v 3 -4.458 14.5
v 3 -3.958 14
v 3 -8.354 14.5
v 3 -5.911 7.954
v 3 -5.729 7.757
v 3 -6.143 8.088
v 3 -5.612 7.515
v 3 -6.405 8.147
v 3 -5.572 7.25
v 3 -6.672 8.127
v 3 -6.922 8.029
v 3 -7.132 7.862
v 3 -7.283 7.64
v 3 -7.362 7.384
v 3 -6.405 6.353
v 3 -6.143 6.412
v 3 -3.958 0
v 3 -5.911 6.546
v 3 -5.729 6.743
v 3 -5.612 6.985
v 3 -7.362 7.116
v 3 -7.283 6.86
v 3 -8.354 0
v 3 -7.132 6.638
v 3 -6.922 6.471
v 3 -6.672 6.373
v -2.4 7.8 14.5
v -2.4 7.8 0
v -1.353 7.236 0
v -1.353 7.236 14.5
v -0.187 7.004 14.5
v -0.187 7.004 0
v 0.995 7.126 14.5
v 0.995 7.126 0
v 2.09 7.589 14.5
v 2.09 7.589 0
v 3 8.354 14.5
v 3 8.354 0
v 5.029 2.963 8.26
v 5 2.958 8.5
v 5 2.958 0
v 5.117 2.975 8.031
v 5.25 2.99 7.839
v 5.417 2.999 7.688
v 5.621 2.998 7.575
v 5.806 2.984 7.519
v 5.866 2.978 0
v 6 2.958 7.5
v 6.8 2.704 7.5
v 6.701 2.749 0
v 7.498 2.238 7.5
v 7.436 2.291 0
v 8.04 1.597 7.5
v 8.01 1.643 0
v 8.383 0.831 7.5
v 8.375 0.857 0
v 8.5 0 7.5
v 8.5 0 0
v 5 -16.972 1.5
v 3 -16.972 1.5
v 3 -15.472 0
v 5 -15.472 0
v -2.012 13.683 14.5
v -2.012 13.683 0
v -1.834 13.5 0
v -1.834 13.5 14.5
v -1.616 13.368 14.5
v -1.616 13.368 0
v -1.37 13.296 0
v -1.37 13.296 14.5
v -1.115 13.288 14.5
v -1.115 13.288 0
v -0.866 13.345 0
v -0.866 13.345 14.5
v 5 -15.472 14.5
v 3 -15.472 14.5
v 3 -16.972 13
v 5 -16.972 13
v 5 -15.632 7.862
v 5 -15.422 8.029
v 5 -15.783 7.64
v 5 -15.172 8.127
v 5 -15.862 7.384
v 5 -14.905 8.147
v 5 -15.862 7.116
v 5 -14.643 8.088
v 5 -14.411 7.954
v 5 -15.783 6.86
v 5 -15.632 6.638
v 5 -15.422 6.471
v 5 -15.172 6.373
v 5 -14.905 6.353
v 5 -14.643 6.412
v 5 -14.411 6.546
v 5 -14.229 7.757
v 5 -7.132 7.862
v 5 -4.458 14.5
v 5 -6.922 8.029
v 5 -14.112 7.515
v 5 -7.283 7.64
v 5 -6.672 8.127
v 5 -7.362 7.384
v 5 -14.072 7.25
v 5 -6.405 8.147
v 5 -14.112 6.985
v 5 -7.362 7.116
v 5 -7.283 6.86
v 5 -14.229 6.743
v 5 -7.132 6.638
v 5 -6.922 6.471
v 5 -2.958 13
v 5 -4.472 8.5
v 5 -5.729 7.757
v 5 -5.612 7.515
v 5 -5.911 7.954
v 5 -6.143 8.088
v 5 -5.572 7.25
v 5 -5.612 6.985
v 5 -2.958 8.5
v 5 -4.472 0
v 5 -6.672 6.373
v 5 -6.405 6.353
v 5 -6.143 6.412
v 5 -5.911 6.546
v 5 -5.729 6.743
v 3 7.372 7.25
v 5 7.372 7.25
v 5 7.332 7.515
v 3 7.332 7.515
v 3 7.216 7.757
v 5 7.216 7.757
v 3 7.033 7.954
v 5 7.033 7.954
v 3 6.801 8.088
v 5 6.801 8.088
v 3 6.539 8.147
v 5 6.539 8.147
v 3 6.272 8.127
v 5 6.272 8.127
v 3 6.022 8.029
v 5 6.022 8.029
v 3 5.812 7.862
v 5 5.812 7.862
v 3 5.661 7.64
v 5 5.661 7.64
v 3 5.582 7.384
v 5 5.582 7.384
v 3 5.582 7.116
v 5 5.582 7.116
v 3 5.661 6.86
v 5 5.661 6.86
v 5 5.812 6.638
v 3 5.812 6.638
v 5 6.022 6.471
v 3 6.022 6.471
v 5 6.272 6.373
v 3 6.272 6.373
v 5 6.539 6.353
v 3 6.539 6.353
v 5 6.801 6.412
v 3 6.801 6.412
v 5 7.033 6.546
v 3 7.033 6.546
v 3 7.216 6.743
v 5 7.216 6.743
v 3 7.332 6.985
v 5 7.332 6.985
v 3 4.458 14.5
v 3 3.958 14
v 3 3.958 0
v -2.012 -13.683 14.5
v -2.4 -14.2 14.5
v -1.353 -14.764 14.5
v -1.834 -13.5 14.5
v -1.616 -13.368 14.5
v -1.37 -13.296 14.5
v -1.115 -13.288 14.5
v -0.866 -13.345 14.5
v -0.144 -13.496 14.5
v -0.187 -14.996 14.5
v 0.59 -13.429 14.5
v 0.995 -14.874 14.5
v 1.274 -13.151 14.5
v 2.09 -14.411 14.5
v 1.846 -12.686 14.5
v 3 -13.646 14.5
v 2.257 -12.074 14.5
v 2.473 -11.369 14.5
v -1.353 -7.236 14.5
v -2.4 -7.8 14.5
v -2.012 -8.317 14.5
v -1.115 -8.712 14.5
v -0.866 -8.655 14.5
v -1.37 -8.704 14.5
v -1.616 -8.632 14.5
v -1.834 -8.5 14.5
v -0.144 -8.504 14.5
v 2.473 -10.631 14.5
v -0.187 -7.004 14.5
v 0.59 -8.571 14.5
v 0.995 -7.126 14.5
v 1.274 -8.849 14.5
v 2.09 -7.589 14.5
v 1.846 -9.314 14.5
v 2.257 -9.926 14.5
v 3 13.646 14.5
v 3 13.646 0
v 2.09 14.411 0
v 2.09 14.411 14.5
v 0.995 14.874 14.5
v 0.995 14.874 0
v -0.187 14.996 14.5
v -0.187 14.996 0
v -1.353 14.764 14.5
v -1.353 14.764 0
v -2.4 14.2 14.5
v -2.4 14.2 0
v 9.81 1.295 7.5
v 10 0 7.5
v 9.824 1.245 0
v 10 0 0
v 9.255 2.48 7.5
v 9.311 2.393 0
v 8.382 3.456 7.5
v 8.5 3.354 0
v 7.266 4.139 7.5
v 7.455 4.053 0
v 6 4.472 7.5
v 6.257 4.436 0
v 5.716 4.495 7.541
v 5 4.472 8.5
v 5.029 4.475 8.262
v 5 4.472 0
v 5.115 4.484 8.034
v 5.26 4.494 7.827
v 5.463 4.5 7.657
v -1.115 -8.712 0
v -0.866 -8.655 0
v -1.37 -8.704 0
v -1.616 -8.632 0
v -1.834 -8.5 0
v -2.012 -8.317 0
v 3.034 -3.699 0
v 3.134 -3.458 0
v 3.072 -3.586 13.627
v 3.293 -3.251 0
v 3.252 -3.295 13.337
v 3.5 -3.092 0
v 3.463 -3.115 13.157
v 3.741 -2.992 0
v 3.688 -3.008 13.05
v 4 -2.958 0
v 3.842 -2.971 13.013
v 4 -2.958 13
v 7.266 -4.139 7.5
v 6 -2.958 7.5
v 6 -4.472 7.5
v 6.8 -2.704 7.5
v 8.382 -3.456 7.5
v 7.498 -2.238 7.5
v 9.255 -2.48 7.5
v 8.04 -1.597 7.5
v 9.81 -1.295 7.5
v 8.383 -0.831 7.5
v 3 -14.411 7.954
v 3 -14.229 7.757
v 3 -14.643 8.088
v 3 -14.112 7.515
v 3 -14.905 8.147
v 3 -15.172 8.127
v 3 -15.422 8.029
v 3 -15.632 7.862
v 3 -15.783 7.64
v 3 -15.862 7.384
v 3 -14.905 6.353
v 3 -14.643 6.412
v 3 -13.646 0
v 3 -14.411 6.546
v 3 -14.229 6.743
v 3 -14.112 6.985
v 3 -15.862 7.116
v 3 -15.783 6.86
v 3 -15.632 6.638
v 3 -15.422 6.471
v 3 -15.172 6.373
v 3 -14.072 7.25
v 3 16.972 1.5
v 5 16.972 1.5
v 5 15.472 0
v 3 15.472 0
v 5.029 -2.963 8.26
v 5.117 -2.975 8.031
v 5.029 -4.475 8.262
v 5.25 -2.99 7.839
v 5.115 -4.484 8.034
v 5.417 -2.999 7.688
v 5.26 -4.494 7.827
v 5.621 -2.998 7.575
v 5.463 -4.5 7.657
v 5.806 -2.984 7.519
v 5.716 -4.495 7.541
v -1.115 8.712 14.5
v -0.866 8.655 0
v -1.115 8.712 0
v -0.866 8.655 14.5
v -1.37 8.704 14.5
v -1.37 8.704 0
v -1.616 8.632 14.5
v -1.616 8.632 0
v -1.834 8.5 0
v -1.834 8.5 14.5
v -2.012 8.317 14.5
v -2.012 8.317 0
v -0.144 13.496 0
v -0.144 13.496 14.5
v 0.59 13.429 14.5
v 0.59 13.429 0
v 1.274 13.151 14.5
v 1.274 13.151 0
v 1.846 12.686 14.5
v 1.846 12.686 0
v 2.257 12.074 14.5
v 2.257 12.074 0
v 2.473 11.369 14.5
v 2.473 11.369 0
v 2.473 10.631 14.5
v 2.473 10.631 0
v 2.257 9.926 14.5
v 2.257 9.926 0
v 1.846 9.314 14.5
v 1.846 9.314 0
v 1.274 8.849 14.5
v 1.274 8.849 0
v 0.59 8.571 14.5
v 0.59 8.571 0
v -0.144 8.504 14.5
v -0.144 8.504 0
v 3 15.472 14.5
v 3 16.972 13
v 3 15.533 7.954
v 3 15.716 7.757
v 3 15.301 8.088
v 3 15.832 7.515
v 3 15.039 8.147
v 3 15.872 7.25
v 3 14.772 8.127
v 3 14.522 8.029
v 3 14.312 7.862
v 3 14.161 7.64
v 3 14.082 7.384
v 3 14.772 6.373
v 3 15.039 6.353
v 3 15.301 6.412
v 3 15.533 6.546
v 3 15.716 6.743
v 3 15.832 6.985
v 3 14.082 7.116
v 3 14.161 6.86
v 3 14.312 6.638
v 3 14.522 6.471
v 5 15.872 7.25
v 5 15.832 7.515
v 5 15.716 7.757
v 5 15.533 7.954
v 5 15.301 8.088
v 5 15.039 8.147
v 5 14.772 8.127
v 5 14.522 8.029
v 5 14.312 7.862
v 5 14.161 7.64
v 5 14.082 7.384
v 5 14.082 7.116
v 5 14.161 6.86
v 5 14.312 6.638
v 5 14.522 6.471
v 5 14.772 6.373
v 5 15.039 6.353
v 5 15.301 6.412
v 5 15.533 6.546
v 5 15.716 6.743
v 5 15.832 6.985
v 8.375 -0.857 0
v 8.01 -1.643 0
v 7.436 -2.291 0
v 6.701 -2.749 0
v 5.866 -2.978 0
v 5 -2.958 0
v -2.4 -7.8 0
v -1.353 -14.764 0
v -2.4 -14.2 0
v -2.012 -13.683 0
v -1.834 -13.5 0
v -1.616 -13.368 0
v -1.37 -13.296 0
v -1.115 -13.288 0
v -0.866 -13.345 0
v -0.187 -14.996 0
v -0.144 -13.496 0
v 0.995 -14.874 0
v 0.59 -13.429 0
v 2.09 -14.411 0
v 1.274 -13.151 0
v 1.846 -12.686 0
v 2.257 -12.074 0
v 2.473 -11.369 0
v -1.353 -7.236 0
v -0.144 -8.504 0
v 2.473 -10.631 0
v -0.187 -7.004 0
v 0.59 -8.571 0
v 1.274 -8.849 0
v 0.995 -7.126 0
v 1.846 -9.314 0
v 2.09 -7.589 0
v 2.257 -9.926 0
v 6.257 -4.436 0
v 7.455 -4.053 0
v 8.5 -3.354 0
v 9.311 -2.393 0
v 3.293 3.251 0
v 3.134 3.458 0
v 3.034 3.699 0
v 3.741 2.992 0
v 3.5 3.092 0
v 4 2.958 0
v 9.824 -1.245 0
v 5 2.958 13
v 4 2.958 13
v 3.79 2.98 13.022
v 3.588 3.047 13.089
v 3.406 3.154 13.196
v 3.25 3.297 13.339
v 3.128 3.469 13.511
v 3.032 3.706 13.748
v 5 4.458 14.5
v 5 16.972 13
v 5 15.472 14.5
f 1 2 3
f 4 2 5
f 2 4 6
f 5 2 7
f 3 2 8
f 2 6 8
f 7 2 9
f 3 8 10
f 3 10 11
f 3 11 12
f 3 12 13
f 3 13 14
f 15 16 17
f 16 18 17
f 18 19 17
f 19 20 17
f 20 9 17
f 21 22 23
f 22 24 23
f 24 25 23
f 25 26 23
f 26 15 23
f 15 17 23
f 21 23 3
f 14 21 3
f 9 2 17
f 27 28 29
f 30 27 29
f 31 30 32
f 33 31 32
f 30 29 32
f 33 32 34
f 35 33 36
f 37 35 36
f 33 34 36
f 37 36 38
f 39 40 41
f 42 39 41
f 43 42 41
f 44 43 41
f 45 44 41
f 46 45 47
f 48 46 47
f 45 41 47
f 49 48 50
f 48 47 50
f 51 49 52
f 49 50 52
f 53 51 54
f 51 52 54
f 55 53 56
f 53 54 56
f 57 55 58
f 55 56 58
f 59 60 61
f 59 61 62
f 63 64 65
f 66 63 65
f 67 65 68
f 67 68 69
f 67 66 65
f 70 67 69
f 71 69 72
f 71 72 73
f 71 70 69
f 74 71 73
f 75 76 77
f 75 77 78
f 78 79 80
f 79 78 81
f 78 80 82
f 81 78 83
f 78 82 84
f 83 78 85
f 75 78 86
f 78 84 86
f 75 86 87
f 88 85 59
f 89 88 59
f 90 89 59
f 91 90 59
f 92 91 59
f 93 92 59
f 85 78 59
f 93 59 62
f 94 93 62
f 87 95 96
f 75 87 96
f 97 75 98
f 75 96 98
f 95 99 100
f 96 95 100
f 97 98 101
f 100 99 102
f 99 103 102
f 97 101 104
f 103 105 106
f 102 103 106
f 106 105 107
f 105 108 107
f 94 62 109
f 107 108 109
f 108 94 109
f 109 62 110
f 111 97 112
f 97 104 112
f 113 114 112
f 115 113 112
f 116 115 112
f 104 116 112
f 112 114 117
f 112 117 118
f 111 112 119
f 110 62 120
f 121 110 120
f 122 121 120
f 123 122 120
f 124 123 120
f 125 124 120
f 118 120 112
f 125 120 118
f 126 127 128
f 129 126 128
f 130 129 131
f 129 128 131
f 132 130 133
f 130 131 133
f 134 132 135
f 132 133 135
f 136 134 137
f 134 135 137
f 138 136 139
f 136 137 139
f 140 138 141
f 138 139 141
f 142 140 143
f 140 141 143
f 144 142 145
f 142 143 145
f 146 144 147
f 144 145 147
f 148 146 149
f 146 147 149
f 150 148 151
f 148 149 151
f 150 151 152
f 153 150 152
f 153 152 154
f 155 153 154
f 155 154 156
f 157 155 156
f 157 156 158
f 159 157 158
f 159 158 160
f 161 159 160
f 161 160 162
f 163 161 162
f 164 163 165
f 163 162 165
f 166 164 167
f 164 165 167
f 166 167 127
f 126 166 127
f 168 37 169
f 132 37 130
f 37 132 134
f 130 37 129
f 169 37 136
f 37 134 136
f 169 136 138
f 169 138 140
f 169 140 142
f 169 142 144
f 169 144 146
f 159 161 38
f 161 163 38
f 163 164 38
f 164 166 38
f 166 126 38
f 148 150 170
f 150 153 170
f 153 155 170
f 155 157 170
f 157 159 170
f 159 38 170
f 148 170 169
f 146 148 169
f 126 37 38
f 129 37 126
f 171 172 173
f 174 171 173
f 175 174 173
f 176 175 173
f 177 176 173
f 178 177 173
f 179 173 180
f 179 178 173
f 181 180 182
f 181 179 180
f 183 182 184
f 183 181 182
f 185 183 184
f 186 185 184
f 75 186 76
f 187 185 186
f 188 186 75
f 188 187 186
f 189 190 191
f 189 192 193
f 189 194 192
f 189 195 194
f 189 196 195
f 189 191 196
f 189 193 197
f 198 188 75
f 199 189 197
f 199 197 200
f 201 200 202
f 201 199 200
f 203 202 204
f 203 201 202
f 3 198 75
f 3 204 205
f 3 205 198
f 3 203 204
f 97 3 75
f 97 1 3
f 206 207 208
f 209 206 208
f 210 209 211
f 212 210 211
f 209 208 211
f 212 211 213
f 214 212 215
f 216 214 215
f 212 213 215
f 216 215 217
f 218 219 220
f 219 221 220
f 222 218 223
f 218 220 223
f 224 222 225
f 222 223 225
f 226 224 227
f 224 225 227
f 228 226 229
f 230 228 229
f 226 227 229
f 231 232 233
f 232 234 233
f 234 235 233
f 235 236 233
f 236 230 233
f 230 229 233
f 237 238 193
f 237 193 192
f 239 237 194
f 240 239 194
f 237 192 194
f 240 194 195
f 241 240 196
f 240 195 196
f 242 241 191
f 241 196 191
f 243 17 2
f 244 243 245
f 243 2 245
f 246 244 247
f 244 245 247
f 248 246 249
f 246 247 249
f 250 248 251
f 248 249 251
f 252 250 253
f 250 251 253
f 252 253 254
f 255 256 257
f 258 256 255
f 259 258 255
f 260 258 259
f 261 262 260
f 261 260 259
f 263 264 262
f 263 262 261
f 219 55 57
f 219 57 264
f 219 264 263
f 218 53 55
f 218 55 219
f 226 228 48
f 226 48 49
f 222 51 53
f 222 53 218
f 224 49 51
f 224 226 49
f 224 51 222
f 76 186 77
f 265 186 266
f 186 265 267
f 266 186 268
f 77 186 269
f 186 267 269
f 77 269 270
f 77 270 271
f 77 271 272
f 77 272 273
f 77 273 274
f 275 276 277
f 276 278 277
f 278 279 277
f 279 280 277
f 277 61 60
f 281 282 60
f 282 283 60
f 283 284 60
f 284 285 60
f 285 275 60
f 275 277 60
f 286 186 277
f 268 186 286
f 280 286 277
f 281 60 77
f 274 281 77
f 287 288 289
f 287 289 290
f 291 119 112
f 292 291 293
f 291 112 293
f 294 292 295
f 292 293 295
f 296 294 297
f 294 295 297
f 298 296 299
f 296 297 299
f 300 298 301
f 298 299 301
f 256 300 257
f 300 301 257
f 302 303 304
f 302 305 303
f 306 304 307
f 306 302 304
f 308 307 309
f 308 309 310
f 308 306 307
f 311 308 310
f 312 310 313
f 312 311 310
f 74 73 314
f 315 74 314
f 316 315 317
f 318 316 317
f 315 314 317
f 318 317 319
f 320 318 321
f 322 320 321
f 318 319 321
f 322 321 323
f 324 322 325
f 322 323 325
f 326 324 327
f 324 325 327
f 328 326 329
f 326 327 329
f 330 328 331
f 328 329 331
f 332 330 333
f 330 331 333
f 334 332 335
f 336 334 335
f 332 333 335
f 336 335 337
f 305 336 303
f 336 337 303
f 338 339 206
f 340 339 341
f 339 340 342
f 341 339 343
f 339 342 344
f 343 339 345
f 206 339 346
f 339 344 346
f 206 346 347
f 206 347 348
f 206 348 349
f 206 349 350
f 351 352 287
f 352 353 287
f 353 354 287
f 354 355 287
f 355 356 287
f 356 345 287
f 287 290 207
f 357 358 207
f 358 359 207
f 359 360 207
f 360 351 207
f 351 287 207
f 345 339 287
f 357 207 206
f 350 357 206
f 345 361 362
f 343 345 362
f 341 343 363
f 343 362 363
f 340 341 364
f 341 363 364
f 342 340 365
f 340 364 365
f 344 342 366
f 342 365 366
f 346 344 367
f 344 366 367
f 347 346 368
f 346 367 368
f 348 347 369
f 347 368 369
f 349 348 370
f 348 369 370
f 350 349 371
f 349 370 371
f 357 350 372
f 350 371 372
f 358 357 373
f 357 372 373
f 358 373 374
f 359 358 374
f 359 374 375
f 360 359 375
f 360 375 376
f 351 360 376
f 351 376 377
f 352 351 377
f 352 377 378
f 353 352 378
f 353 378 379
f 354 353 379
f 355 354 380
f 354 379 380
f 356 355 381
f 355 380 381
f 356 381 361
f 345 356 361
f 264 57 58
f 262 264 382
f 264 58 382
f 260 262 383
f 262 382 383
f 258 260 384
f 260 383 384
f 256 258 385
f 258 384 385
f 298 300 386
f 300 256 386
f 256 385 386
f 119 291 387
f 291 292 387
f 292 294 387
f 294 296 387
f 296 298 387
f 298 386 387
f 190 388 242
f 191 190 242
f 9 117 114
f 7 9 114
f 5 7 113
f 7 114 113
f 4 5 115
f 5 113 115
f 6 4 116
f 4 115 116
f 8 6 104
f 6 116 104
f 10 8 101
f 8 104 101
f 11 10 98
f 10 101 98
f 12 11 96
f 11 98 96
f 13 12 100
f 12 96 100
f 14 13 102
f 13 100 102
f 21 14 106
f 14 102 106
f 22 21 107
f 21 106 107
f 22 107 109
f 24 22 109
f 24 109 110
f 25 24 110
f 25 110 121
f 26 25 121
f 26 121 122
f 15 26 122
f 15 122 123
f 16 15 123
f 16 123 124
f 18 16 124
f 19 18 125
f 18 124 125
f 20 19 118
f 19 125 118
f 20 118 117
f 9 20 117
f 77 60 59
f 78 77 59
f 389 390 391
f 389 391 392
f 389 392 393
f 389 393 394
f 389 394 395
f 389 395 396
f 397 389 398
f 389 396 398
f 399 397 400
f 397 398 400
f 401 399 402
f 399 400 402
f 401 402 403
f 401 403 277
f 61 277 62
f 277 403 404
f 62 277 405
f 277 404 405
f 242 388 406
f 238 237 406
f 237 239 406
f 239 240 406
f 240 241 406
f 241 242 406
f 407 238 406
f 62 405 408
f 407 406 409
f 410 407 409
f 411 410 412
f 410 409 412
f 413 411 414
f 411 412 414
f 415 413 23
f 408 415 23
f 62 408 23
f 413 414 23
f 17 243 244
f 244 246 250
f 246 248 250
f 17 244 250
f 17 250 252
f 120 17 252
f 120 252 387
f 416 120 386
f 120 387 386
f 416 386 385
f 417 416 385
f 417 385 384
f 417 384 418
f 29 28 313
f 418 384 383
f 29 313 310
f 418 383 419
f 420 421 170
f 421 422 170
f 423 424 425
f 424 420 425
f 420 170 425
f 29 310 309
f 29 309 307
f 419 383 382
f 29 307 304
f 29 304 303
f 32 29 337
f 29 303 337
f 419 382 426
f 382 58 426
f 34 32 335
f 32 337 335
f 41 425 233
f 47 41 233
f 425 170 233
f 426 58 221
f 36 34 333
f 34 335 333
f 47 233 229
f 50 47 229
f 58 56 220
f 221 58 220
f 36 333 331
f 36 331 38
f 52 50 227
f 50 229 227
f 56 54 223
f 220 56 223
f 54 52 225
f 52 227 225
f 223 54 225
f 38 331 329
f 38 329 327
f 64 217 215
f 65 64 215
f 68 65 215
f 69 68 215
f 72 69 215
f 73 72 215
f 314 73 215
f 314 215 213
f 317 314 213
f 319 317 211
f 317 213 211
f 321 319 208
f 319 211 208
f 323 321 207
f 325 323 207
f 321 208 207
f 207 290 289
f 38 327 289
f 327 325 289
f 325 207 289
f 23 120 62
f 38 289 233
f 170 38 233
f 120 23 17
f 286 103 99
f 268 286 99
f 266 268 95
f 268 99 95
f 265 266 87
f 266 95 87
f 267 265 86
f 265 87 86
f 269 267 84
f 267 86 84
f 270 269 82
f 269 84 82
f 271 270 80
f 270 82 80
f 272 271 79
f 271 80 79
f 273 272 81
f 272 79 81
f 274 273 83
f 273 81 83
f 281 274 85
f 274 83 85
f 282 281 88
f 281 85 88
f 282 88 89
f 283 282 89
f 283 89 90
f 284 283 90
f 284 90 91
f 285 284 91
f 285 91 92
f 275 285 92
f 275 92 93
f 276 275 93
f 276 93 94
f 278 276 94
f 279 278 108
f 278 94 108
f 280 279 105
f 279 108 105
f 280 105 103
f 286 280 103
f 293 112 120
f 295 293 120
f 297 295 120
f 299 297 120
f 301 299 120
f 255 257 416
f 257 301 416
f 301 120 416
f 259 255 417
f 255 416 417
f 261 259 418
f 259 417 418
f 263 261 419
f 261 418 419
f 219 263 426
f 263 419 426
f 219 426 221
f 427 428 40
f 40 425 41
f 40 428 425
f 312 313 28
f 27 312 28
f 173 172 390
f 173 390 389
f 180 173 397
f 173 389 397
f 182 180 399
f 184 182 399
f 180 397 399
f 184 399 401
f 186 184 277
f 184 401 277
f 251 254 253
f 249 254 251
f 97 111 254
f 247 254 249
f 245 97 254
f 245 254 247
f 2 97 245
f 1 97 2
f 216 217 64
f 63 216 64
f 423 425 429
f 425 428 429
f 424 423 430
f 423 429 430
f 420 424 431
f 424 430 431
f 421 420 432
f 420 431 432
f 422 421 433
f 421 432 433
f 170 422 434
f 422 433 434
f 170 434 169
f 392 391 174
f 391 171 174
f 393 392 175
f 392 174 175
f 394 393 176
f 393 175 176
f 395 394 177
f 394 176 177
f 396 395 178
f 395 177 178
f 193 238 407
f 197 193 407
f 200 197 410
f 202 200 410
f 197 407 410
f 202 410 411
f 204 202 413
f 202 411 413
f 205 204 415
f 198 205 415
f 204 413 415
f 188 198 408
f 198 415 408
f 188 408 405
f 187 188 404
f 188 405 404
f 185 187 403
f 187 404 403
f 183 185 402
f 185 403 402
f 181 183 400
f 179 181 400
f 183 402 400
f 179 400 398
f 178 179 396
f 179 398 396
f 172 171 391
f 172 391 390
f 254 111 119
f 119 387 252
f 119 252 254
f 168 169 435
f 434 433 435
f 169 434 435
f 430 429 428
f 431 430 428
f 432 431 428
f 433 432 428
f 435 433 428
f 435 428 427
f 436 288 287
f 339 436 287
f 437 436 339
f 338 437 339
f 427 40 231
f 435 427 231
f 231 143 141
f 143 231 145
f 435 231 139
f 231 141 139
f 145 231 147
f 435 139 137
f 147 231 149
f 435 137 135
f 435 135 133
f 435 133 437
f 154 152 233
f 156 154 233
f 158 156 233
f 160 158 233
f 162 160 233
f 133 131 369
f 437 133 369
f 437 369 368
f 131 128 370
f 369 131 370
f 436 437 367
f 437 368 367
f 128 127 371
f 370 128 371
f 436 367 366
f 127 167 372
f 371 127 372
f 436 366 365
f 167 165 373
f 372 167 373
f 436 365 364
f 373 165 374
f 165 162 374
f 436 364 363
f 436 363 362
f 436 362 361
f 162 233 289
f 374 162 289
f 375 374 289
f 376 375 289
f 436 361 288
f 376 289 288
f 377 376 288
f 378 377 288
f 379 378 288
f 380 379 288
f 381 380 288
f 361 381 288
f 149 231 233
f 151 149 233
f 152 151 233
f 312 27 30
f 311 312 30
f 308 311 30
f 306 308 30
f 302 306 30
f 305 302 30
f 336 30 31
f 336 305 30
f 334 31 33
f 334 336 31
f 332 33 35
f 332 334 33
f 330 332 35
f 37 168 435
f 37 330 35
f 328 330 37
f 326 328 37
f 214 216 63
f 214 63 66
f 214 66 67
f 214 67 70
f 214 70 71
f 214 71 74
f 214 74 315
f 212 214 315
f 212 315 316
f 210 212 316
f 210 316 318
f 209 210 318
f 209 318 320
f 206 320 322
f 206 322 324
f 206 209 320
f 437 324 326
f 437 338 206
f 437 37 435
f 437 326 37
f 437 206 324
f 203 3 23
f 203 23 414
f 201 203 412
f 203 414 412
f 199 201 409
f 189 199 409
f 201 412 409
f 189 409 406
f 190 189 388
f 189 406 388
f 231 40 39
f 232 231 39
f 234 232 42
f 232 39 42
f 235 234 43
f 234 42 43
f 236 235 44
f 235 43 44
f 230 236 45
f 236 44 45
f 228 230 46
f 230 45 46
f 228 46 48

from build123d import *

# Parameters (mm, degrees)
F1_DEPTH = 14.5
F2_DEPTH = 14.5
F4_DEPTH = 7
F5_R     = 0.9
F6_DEPTH = 2
F7_SIZE  = 1.5
F8_R     = 1


with BuildPart() as f1:
    # F0 (on Top) → F1 (new body)
    with BuildSketch(Plane.XY):
        with BuildLine():
            Line((5, 4.472136), (5, 15))
            Line((5, 15), (5, 16.972136))
            Line((5, 16.972136), (3, 16.972136))
            Line((3, 16.972136), (3, 15))
            Line((3, 15), (3, 13.645751))
            ThreePointArc((3, 13.645751), (4, 11), (3, 8.354249))
            Line((3, 8.354249), (3, 2.95804))
            Line((3, 2.95804), (5, 2.95804))
            ThreePointArc((5, 2.95804), (7.436492, 2.291288), (8.5, 0))
            ThreePointArc((8.5, 0), (7.436492, -2.291288), (5, -2.95804))
            Line((5, -2.95804), (3, -2.95804))
            Line((3, -2.95804), (3, -8.354249))
            ThreePointArc((3, -8.354249), (4, -11), (3, -13.645751))
            Line((3, -13.645751), (3, -15))
            Line((3, -15), (3, -16.972136))
            Line((3, -16.972136), (5, -16.972136))
            Line((5, -16.972136), (5, -15))
            Line((5, -15), (5, -4.472136))
            ThreePointArc((5, -4.472136), (8.5, -3.354102), (10, 0))
            ThreePointArc((10, 0), (8.5, 3.354102), (5, 4.472136))
        make_face()
    extrude(amount=F1_DEPTH)

    # F0 (on Top) → F2 (join)
    with BuildSketch(Plane.XY):
        with BuildLine():
            ThreePointArc((3, 8.354249), (4, 11), (3, 13.645751))
            ThreePointArc((3, 13.645751), (0.408409, 14.979096), (-2.4, 14.2))
            Line((-2.4, 14.2), (-1.5, 13))
            ThreePointArc((-1.5, 13), (2.5, 11), (-1.5, 9))
            Line((-1.5, 9), (-2.4, 7.8))
            ThreePointArc((-2.4, 7.8), (0.408409, 7.020904), (3, 8.354249))
        make_face()
        with BuildLine():
            ThreePointArc((-2.4, -14.2), (0.408409, -14.979096), (3, -13.645751))
            ThreePointArc((3, -13.645751), (4, -11), (3, -8.354249))
            ThreePointArc((3, -8.354249), (0.408409, -7.020904), (-2.4, -7.8))
            Line((-2.4, -7.8), (-1.5, -9))
            ThreePointArc((-1.5, -9), (2.5, -11), (-1.5, -13))
            Line((-1.5, -13), (-2.4, -14.2))
        make_face()
    extrude(amount=F2_DEPTH)

    # F3 (on face) → F4 (cut)
    with BuildSketch(Plane.XY.offset(14.5)):
        with BuildLine():
            Line((5, -2.95804), (5, -4.472136))
            ThreePointArc((5, -4.472136), (10, 0), (5, 4.472136))
            Line((5, 4.472136), (5, 2.95804))
            ThreePointArc((5, 2.95804), (8.5, 0), (5, -2.95804))
        make_face()
    extrude(amount=-F4_DEPTH, mode=Mode.SUBTRACT)

    # F5 (on face) → F6 (cut)
    with BuildSketch(Plane.YZ.offset(5)):
        with Locations((-14.972136, 7.25)):
            Circle(F5_R)
        with Locations((-6.472136, 7.25)):
            Circle(F5_R)
        with Locations((6.472136, 7.25)):
            Circle(F5_R)
        with Locations((14.972136, 7.25)):
            Circle(F5_R)
    extrude(amount=-F6_DEPTH, mode=Mode.SUBTRACT)

    # F7
    f7_edges = [f1.edges().sort_by_distance(p)[0] for p in [
        (4, -16.972136, 14.5),
        (4, -16.972136, 0),
        (4, 16.972136, 0),
        (4, 16.972136, 14.5),
        (4, 2.95804, 14.5),
        (4, -2.95804, 14.5),
    ]]
    chamfer(f7_edges, length=F7_SIZE)

    # F8
    f8_edges = [f1.edges().sort_by_distance(p)[0] for p in [
        (-1.5, -9, 7.25),
        (-1.5, 13, 7.25),
        (-1.5, -13, 7.25),
        (-1.5, 9, 7.25),
        (5, -3.715088, 7.5),
        (5, 3.715088, 7.5),
        (3, 2.95804, 6.5),
        (3, -2.95804, 6.5),
    ]]
    fillet(f8_edges, radius=F8_R)


solid = f1.part
